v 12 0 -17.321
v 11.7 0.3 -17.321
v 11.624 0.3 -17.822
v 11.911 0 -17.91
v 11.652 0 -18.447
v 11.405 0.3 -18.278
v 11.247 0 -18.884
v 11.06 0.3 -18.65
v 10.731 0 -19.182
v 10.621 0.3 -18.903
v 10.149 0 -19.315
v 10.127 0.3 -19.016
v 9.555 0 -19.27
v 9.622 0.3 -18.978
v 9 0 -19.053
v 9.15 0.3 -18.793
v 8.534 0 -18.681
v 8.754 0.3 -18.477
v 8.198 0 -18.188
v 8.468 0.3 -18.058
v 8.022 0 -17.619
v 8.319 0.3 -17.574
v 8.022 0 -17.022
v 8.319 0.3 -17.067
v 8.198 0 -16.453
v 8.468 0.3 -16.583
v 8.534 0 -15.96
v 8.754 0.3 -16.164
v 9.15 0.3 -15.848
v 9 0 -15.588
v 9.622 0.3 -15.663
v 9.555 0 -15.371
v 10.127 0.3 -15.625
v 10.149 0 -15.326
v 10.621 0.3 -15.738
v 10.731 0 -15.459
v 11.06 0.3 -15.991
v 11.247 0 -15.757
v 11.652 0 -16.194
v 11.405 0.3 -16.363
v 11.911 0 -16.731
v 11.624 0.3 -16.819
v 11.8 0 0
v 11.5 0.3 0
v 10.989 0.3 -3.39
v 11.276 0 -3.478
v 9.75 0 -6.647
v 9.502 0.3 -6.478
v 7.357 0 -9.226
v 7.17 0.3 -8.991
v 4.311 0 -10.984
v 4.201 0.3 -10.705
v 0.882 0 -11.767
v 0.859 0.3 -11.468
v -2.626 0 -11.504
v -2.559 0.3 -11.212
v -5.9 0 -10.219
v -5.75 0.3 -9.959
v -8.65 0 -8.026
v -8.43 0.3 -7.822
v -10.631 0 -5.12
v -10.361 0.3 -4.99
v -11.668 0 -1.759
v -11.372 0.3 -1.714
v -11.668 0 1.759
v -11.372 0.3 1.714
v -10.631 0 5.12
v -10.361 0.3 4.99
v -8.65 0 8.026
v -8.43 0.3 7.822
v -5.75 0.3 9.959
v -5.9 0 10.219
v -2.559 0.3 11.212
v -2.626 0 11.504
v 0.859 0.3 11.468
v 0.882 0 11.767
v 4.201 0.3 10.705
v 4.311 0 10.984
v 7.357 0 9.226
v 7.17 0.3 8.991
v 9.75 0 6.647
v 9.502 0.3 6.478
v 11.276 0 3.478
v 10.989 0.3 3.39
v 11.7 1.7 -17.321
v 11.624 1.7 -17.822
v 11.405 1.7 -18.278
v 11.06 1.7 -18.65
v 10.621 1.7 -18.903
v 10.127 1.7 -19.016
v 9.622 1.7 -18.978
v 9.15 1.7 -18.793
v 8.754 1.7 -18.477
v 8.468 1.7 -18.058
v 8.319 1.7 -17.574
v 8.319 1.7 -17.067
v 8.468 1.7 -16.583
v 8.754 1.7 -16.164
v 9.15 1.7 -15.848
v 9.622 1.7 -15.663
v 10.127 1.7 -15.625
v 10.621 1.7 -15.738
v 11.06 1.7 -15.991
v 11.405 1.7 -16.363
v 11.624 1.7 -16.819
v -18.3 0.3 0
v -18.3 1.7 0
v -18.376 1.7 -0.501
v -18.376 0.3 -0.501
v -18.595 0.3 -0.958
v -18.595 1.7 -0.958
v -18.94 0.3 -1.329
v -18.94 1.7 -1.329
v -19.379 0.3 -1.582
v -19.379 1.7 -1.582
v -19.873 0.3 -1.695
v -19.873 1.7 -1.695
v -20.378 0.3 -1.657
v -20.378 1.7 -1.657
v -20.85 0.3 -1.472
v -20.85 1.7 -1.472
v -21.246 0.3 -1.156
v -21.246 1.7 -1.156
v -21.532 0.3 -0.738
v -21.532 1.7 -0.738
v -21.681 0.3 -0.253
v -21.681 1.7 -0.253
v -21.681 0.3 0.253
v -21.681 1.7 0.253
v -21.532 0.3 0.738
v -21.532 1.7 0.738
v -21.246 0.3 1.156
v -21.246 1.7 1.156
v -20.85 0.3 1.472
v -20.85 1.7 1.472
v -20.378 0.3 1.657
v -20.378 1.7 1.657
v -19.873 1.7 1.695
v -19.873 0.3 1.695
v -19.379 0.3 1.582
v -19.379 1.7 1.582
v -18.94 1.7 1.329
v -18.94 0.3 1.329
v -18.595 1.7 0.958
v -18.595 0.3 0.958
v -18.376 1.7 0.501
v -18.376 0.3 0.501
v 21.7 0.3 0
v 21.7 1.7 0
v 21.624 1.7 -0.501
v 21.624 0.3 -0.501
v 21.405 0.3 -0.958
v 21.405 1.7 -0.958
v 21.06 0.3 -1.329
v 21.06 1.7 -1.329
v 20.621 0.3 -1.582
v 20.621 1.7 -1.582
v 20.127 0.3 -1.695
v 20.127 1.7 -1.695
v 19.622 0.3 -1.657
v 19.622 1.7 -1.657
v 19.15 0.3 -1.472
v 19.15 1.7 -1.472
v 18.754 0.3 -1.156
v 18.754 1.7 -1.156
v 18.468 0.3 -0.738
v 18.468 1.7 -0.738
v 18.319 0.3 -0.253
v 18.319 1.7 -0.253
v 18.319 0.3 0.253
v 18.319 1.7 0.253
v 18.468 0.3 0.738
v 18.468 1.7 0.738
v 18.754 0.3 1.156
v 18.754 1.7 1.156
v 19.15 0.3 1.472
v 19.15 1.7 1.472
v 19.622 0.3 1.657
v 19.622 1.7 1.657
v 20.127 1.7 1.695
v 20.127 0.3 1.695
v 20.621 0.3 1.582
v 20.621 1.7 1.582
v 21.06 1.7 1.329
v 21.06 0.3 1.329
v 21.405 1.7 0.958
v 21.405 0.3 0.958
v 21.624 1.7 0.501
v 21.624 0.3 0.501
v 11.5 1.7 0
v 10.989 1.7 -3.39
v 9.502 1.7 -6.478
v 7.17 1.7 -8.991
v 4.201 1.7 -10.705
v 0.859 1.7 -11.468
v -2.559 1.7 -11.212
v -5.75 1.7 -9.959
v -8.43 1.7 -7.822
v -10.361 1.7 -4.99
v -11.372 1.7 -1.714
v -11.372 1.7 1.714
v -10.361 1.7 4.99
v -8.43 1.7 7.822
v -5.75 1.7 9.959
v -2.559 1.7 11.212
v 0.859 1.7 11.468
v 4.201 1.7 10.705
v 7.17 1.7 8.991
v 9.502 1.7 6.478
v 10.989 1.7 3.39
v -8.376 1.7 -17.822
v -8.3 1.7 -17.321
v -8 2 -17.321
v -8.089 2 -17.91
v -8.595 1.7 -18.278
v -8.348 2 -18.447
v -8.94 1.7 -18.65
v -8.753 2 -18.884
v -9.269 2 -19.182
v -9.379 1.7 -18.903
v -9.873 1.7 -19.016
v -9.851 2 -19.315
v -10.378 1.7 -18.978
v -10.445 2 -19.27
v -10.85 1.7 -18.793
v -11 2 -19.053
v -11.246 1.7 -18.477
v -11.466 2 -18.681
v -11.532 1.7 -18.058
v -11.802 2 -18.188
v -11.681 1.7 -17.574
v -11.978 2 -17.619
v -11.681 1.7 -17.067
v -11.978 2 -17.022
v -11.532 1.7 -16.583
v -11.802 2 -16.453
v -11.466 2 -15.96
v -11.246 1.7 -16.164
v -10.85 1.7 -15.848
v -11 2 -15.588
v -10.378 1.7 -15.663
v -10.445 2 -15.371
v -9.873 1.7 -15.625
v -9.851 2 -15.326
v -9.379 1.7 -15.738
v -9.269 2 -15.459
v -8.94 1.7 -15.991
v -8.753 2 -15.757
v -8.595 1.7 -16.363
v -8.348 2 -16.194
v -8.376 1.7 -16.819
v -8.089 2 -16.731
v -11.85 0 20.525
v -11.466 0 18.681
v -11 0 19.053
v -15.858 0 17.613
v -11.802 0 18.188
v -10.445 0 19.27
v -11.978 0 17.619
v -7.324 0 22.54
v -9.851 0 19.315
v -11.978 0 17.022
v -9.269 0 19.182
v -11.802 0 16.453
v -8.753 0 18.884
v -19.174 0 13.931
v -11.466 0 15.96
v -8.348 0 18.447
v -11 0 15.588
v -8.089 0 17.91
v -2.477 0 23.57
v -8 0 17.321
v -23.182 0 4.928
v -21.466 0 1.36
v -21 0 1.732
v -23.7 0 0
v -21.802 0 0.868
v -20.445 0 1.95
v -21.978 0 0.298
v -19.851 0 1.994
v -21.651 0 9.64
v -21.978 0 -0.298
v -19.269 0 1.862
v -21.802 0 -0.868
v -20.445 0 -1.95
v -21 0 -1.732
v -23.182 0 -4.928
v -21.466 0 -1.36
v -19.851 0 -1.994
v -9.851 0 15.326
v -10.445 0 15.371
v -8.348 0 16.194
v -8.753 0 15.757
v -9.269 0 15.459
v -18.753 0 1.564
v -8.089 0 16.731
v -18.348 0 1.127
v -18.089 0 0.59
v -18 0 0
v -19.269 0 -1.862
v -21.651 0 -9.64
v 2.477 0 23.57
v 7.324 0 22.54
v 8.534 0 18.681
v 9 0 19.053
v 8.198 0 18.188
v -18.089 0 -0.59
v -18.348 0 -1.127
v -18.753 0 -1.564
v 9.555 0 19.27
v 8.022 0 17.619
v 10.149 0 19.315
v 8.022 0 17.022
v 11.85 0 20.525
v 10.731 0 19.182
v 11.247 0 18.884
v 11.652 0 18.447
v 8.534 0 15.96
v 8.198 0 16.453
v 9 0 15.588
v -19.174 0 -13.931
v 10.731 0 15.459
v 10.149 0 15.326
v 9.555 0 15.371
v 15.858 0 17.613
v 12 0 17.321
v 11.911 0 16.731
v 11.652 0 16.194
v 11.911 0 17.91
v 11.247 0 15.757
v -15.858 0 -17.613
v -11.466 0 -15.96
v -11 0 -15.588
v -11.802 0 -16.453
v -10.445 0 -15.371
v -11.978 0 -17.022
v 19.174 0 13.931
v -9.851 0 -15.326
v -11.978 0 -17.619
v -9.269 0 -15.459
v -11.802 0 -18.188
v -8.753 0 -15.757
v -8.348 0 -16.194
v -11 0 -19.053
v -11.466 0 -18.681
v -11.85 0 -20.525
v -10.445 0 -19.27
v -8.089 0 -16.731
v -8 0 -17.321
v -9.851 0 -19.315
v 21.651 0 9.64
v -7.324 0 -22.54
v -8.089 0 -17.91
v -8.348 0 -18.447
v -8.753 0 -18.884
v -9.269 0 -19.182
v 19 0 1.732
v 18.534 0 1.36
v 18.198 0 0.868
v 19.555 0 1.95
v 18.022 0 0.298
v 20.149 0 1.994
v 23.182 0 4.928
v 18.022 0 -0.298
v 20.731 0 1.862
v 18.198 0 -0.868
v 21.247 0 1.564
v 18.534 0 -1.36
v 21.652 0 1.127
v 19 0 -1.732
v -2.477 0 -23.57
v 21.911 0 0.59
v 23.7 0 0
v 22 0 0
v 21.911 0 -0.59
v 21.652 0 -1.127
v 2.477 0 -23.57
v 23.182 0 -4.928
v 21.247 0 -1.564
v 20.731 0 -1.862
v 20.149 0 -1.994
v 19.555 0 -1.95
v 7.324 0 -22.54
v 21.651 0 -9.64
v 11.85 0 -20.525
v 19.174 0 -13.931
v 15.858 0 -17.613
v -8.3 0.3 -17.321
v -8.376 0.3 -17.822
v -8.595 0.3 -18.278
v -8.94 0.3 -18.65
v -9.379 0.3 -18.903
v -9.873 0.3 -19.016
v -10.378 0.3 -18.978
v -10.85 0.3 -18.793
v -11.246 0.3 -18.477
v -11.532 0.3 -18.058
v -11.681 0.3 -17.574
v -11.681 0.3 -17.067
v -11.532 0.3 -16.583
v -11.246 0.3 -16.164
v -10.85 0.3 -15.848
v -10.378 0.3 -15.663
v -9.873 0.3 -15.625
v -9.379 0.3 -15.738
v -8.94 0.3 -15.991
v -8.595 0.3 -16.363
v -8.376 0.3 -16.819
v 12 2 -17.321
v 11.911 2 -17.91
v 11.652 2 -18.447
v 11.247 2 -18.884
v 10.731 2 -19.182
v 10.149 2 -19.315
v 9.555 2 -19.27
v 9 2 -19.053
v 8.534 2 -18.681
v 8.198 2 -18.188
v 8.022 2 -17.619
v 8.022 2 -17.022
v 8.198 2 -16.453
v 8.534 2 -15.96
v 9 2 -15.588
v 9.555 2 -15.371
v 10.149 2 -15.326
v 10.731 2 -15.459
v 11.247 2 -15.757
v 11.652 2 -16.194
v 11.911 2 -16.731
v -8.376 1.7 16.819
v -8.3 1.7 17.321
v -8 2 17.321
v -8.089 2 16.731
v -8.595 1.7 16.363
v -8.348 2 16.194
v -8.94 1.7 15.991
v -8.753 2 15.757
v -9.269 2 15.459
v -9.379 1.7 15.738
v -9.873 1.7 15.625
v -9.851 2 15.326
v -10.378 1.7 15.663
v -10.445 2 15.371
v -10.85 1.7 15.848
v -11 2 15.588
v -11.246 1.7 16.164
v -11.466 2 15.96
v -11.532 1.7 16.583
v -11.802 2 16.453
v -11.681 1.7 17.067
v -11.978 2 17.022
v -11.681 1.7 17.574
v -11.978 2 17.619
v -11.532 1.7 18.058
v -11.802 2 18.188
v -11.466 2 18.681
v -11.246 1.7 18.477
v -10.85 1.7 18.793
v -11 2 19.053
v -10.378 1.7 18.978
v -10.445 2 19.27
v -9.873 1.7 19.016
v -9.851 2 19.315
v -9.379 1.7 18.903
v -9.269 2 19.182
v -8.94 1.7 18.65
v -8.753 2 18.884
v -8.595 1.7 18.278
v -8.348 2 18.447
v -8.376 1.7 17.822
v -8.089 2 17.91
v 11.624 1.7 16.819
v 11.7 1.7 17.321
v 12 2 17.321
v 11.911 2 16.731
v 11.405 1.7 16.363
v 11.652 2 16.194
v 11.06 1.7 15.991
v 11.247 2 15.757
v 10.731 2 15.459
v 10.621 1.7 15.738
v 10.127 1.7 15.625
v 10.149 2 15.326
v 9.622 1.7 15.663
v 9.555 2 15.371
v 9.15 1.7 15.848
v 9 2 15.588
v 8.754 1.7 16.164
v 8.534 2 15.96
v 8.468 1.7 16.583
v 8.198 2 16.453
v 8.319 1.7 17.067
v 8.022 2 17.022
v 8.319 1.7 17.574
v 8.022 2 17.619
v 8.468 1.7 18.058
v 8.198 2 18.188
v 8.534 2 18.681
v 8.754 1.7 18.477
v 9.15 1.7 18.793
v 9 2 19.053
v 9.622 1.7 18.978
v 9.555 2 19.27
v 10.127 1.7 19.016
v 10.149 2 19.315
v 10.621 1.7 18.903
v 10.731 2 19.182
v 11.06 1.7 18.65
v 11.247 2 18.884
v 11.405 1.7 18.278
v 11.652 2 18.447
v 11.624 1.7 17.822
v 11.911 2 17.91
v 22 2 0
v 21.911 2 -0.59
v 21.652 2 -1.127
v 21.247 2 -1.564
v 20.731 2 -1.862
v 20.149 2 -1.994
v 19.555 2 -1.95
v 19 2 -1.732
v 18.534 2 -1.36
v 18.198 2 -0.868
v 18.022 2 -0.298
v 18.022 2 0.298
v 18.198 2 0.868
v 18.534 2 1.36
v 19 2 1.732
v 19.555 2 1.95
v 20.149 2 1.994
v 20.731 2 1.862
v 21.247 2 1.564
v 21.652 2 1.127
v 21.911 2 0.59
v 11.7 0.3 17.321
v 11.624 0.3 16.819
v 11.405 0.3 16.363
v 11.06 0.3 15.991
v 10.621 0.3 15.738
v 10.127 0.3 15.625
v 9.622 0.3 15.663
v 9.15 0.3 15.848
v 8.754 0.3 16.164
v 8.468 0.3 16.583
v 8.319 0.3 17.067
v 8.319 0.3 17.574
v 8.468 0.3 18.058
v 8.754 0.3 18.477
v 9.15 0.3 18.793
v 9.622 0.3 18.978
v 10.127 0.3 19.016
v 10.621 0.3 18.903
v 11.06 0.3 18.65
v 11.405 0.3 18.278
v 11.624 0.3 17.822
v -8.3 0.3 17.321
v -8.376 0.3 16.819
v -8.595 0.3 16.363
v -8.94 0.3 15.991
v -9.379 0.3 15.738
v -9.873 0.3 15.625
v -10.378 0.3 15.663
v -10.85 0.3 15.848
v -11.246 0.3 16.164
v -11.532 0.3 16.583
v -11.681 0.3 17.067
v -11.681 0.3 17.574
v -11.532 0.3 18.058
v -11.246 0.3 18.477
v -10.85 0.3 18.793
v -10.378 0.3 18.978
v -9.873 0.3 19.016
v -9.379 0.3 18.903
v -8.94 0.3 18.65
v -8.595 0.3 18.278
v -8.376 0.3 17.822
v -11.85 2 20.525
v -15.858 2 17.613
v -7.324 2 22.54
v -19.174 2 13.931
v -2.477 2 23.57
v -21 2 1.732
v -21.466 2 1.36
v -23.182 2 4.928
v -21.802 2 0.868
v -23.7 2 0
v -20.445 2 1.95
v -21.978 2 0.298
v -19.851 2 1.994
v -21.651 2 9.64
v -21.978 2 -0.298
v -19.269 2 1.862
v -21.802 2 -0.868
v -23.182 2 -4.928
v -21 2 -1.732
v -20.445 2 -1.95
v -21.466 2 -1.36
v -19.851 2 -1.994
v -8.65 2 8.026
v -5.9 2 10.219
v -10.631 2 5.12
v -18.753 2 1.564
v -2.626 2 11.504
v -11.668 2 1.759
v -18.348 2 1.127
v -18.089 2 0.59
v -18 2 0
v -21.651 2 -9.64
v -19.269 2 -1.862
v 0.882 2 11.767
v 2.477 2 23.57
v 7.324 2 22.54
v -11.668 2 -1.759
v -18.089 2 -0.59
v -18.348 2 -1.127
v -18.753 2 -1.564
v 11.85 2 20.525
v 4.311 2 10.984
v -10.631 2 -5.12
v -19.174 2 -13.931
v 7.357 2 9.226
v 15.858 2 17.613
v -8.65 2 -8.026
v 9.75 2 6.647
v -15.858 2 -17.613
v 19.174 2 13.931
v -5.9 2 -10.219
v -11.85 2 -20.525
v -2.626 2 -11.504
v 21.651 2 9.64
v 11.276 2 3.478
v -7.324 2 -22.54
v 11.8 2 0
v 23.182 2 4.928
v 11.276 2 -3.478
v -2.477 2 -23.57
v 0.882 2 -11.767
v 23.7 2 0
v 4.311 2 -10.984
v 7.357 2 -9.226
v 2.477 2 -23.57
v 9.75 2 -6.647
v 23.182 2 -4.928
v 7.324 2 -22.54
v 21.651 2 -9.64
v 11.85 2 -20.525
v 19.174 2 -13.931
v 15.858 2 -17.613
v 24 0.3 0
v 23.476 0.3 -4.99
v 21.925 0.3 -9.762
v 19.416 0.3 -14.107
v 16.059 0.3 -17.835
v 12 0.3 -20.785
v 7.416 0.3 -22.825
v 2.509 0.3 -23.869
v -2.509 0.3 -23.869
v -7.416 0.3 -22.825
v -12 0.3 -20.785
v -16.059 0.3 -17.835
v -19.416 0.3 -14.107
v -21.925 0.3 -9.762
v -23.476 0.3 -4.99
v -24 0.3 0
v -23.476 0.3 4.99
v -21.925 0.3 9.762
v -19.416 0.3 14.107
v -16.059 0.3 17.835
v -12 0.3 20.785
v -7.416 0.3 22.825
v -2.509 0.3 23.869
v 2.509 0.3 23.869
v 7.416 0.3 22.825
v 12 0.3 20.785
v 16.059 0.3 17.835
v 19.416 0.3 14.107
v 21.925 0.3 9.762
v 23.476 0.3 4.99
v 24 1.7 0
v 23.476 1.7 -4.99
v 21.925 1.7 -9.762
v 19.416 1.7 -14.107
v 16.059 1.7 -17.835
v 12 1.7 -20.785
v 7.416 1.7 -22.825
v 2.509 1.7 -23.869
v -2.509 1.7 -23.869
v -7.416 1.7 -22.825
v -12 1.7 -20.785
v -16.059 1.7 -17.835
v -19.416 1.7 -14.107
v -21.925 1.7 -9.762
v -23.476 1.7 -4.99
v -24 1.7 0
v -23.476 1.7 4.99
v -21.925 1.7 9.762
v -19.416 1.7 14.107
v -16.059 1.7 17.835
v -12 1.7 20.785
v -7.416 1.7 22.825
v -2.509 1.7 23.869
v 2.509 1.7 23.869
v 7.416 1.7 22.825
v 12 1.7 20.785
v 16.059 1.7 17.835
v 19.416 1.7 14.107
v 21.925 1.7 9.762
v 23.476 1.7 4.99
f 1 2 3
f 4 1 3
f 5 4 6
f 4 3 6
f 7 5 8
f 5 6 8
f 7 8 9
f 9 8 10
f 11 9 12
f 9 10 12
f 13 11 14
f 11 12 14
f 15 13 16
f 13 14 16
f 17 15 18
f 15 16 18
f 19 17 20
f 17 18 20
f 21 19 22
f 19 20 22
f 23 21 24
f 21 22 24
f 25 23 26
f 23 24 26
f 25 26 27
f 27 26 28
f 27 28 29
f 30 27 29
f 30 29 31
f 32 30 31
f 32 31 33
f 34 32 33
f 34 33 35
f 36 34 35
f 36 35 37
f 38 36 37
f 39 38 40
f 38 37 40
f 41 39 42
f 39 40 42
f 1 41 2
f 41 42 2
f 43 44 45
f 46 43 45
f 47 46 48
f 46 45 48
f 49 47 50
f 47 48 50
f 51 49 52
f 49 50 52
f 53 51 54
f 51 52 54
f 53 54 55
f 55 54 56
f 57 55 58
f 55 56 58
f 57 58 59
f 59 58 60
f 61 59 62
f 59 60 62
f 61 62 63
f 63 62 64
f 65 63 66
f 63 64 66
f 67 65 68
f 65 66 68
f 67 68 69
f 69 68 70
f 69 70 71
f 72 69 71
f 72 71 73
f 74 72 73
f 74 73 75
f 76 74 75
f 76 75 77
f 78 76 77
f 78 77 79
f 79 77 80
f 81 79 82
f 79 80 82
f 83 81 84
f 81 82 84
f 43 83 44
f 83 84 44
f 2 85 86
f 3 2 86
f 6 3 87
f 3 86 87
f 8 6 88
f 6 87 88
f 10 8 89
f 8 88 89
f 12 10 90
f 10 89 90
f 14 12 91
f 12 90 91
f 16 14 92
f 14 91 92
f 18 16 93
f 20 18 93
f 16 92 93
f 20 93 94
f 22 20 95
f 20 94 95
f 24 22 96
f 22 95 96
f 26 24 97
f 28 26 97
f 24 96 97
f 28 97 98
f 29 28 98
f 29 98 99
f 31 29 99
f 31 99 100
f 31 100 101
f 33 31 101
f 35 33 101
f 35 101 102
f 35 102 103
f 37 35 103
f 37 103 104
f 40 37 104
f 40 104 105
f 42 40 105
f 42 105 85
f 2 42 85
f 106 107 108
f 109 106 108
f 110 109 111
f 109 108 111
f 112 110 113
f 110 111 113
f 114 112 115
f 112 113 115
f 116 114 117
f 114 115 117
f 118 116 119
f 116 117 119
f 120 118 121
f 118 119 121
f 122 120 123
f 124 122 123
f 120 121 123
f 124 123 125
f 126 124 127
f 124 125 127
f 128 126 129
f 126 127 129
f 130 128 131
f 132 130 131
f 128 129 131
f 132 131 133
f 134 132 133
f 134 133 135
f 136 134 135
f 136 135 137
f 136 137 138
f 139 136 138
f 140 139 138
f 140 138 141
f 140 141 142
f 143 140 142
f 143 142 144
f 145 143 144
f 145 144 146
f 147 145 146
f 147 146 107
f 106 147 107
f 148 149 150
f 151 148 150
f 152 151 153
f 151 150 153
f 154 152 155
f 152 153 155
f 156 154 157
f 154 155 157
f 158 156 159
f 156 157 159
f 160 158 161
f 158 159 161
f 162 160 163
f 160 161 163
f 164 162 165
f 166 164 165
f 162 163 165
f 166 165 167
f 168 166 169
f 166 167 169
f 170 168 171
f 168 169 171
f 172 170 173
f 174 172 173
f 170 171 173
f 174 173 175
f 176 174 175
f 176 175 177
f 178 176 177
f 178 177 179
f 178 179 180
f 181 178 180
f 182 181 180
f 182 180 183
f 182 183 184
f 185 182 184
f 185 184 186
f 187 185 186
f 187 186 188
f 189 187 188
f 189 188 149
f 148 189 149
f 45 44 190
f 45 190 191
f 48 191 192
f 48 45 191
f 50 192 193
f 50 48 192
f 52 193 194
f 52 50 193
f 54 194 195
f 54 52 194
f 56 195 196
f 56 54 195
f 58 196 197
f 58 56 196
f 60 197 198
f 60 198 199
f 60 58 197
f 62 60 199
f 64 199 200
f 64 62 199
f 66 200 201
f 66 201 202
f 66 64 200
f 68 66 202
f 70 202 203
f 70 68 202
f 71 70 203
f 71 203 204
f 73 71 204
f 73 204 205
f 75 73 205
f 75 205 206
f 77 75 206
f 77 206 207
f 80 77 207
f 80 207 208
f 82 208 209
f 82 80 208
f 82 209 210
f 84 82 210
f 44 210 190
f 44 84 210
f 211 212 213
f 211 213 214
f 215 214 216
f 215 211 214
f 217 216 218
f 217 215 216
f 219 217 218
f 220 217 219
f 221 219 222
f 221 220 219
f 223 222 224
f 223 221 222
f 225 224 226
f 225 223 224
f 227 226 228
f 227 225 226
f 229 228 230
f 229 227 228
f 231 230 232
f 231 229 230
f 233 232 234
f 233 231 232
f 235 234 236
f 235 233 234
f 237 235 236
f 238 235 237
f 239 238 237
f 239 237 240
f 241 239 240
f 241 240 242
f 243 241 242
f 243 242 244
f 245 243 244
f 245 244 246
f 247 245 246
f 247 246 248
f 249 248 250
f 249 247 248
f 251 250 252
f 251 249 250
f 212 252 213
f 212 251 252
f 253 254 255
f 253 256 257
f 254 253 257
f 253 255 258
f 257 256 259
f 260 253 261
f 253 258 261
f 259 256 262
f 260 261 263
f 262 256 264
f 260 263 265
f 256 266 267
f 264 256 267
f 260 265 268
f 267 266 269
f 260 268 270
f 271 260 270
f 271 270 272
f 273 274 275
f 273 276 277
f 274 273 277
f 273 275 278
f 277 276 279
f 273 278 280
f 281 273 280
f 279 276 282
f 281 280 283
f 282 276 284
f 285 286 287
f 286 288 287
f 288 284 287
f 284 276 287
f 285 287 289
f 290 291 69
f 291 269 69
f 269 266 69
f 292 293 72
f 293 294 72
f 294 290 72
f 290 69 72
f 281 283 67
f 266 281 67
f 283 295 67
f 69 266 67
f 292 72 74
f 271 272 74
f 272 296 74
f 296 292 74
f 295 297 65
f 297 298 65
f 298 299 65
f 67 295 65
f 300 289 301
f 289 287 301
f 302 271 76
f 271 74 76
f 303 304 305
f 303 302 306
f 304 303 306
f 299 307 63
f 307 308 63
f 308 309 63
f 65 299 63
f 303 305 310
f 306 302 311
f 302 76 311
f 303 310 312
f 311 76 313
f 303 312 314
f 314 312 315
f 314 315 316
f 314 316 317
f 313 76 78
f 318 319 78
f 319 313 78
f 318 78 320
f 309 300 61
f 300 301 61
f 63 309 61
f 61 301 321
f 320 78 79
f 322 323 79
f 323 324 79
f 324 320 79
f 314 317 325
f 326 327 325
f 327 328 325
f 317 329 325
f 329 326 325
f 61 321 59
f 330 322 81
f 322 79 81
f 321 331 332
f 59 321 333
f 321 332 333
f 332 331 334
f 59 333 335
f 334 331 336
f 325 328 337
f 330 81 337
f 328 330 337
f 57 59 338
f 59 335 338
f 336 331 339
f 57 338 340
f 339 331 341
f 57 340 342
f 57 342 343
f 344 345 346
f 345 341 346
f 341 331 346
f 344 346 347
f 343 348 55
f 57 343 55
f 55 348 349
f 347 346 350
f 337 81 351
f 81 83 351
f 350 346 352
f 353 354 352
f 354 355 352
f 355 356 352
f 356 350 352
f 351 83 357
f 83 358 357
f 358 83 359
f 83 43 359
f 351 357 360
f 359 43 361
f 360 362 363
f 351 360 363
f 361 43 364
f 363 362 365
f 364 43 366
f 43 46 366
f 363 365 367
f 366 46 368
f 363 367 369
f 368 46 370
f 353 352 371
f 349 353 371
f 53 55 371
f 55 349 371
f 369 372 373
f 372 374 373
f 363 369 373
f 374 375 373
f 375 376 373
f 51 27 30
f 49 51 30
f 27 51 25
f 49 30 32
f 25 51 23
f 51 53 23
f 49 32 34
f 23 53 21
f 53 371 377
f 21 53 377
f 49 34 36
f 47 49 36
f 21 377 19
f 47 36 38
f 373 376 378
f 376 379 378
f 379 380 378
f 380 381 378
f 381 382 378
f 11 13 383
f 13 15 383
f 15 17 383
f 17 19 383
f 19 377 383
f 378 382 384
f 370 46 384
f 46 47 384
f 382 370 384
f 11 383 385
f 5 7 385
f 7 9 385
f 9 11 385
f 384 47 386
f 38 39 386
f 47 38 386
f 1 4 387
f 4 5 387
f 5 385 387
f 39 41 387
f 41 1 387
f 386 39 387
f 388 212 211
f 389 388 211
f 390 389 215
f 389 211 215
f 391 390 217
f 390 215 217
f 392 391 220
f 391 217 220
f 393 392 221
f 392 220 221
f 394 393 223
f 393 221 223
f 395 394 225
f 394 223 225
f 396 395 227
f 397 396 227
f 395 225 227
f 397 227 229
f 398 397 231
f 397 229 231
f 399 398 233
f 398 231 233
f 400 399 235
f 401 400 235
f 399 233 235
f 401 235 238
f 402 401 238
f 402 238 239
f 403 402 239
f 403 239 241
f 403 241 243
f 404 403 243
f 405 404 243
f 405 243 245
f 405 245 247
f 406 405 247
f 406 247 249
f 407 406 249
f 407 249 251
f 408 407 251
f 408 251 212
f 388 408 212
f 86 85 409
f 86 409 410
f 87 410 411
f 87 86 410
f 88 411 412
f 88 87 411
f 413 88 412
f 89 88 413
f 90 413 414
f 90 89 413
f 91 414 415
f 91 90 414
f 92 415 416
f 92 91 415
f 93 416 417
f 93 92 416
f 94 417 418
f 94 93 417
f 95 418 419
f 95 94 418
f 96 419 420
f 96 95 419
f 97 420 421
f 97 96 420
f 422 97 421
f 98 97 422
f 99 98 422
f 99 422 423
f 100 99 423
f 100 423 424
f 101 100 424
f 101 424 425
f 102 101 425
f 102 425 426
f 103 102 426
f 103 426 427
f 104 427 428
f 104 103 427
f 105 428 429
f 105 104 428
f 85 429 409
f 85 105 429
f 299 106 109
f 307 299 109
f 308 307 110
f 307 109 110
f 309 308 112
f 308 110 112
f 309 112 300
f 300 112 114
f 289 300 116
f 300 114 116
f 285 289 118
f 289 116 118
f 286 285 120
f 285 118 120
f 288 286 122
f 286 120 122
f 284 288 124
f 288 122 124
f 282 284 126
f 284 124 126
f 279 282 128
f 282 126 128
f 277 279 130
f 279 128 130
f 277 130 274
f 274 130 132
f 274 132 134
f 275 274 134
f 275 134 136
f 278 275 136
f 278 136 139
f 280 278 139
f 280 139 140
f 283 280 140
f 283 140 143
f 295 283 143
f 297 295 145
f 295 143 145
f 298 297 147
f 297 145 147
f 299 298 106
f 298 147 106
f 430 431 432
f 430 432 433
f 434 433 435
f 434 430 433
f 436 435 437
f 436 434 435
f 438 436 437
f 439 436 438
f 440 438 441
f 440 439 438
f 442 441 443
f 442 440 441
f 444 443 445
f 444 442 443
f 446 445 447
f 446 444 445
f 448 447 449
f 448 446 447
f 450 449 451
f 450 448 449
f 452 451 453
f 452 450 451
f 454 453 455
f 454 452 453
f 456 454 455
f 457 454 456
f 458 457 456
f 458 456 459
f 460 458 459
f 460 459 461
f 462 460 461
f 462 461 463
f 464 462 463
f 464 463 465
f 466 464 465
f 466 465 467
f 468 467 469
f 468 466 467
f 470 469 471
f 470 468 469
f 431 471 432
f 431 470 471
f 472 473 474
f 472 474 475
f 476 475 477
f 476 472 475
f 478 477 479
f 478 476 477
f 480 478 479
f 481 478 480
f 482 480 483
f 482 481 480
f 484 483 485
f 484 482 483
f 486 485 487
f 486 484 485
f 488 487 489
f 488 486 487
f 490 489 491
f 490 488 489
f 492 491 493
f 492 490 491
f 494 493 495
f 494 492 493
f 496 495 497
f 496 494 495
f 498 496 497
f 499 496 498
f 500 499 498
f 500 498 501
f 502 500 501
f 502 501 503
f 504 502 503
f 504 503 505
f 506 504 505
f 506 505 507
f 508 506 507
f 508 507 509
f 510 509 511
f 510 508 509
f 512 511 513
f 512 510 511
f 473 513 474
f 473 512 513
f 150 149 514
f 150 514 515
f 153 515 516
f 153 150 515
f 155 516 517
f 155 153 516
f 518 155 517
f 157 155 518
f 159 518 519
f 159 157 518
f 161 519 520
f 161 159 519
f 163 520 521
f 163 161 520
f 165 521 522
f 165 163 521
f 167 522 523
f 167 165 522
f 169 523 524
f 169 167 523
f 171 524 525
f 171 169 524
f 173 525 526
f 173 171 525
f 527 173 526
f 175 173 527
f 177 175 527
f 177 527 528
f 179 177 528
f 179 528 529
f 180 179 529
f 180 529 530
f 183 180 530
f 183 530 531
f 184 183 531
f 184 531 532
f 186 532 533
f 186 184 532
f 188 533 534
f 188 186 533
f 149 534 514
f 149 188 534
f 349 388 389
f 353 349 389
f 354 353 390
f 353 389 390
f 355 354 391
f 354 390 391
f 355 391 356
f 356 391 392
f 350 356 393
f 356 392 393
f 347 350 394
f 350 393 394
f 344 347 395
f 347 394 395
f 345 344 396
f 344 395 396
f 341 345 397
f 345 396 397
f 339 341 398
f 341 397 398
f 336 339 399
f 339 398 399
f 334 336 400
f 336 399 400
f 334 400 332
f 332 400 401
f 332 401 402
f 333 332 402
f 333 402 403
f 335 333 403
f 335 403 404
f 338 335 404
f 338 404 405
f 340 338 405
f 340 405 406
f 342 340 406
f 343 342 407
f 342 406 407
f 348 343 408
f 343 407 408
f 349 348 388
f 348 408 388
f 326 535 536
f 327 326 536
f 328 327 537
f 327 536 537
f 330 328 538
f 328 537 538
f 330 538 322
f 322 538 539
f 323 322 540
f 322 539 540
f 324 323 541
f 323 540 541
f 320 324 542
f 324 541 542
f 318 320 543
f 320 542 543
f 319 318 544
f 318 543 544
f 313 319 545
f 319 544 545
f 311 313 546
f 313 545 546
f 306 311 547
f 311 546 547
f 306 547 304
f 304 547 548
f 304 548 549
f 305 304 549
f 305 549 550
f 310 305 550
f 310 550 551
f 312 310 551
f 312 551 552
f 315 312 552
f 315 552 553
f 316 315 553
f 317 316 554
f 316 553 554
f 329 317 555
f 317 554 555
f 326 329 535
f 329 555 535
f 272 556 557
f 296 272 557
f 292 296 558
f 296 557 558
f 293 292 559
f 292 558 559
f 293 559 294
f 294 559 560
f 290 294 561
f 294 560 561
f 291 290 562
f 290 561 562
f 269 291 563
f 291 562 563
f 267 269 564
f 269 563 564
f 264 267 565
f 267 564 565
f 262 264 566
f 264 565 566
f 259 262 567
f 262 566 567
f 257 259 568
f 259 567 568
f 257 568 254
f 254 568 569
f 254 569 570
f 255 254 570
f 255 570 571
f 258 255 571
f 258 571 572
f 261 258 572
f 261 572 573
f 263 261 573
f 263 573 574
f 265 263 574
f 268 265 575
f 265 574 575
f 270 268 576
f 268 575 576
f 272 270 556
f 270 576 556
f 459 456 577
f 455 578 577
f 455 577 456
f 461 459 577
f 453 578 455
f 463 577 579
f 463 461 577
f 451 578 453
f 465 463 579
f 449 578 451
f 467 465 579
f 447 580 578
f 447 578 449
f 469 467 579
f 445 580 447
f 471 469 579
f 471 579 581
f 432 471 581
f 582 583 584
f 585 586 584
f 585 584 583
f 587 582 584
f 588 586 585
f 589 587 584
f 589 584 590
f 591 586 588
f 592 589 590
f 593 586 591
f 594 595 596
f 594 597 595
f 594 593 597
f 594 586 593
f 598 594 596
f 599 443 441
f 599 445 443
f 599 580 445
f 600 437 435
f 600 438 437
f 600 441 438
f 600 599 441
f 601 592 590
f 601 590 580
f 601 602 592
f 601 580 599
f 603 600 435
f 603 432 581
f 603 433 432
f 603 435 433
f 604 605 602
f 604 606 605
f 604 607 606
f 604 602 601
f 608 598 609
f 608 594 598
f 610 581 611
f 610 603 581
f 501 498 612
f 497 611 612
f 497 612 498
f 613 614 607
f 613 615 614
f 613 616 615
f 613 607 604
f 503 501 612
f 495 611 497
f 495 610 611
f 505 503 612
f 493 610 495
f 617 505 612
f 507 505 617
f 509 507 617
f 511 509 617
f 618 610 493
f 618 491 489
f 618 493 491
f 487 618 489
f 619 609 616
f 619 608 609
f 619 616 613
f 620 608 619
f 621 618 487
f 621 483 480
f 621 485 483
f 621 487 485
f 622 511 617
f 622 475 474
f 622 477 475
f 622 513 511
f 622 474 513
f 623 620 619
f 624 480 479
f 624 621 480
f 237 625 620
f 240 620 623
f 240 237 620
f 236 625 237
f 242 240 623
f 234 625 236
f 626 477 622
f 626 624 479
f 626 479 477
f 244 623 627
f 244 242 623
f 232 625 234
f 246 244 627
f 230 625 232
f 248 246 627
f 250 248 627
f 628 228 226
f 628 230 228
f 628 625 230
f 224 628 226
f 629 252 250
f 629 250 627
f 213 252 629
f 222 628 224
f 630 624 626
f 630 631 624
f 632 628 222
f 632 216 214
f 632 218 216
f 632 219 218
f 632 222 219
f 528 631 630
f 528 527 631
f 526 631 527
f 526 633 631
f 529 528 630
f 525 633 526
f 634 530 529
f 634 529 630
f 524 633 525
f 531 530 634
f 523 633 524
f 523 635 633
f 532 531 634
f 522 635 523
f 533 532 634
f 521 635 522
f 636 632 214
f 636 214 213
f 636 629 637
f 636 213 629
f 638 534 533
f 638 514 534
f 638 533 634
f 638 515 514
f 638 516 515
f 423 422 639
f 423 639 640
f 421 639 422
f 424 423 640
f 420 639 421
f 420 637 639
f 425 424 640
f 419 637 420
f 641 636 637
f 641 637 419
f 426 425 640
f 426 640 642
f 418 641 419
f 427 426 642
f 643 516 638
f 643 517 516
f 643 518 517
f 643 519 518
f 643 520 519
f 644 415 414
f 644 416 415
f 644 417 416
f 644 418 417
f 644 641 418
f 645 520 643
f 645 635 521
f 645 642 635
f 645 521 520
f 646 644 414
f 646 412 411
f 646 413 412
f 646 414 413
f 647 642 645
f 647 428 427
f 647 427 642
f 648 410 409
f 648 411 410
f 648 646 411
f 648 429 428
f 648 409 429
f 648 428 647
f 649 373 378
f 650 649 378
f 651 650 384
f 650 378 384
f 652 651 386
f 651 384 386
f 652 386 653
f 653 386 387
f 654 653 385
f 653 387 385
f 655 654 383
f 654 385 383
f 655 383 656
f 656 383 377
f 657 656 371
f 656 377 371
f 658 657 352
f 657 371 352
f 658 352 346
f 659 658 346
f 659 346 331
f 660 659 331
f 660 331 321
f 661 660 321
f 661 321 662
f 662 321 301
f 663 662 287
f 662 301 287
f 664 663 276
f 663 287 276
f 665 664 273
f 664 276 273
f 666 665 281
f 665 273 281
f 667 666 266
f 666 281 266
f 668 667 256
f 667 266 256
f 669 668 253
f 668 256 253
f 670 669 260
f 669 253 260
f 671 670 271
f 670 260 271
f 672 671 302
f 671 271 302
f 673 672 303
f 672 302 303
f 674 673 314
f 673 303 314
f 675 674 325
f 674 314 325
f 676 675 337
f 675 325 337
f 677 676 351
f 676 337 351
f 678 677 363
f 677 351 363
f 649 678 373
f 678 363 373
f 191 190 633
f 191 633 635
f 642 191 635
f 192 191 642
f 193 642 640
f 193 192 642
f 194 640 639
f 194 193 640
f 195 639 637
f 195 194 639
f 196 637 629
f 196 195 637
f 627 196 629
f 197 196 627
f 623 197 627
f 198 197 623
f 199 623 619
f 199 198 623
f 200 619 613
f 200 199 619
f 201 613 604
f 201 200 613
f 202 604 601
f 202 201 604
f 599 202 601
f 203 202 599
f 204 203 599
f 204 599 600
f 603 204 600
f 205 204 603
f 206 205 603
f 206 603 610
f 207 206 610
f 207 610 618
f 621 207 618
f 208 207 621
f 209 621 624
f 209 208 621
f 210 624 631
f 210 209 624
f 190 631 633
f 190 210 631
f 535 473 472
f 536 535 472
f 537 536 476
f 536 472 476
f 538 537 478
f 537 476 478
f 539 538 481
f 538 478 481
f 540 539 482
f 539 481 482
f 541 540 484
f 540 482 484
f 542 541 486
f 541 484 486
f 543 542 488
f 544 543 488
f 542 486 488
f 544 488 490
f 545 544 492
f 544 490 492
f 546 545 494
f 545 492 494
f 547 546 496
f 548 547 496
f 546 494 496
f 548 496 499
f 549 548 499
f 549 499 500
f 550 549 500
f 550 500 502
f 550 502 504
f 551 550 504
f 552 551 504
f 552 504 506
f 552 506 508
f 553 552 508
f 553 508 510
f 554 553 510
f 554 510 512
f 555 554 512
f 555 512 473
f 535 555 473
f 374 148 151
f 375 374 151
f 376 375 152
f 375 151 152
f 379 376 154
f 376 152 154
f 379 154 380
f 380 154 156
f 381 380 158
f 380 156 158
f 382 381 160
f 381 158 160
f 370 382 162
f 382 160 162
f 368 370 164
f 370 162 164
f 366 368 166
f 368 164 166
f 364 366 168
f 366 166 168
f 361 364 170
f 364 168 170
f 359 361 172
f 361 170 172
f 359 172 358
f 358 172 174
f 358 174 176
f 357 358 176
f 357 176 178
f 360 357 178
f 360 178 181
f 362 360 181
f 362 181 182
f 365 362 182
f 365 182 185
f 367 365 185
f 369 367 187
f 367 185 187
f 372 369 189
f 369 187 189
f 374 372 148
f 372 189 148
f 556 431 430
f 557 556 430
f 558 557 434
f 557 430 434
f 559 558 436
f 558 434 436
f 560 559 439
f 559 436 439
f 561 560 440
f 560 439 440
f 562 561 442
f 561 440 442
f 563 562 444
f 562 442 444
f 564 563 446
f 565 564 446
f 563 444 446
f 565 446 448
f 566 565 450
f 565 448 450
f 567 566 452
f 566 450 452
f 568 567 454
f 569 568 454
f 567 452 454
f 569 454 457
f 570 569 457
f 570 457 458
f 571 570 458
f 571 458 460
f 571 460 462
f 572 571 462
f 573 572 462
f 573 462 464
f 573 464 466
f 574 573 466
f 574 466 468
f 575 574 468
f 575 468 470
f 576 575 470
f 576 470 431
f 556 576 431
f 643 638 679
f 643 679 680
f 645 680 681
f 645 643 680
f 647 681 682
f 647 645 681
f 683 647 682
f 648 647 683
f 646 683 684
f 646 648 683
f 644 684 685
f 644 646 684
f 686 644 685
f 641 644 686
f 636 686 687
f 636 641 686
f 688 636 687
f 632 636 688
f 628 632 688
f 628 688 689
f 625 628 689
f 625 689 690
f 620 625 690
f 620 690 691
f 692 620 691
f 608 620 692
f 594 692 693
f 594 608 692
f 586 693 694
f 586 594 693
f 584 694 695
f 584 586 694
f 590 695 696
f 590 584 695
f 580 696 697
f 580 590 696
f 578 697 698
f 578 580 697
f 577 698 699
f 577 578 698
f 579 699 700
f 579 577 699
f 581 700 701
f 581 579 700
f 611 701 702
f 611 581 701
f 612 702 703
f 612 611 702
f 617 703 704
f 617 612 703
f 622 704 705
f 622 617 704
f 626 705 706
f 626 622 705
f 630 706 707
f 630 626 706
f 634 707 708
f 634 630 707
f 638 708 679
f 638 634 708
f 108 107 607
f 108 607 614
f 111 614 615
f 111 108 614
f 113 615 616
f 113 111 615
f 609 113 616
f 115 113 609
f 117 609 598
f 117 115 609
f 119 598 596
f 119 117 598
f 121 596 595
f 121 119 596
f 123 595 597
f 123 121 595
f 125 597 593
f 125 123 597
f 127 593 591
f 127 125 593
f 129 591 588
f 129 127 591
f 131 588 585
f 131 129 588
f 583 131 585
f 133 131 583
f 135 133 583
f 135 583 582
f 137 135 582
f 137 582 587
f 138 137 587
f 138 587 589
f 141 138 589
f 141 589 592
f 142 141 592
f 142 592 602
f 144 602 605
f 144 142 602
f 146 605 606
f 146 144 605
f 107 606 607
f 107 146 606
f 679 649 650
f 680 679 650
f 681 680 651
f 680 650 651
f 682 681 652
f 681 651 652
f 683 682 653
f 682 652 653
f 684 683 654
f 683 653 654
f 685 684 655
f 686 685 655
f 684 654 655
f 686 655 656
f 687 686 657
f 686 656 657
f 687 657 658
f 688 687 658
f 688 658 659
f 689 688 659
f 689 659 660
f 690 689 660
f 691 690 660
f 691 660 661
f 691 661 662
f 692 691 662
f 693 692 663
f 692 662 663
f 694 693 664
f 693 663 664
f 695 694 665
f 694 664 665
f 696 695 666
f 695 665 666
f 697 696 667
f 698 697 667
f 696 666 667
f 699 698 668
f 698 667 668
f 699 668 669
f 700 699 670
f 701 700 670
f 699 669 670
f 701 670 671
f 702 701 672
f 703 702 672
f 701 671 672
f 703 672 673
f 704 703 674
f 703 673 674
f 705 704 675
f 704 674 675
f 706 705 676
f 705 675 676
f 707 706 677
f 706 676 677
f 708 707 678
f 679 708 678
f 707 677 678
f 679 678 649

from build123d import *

# Parameters (mm, degrees)
SKETCH1_R           = 24
SKETCH1_R_2         = 11.5
BOSS_EXTRUDE1_DEPTH = 2
SKETCH2_R           = 1.7
CUT_EXTRUDE1_DEPTH  = 3
CHAMFER2_SIZE       = 0.3


with BuildPart() as part:
    # Sketch1 → Boss-Extrude1 (new body)
    with BuildSketch(Plane(origin=(0, 0, 0), x_dir=(1, 0, 0), z_dir=(0, 1, 0))):
        Circle(SKETCH1_R)
        Circle(SKETCH1_R_2, mode=Mode.SUBTRACT)
    extrude(amount=BOSS_EXTRUDE1_DEPTH)

    # Sketch2 → Cut-Extrude1 (cut, through all)
    with BuildSketch(Plane(origin=(0, 2, 0), x_dir=(1, 0, 0), z_dir=(0, 1, 0))):
        with Locations((-20, 0)):
            Circle(SKETCH2_R)
        with Locations((-10, 17.320508076)):
            Circle(SKETCH2_R)
        with Locations((10, 17.320508076)):
            Circle(SKETCH2_R)
        with Locations((20, 0)):
            Circle(SKETCH2_R)
        with Locations((10, -17.320508076)):
            Circle(SKETCH2_R)
        with Locations((-10, -17.320508076)):
            Circle(SKETCH2_R)
    extrude(amount=-CUT_EXTRUDE1_DEPTH, mode=Mode.SUBTRACT)

    # Chamfer2
    chamfer2_edges = [part.edges().sort_by_distance(p)[0] for p in [
        (-21.7, 0, 0),
        (-21.7, 2, 0),
        (-24, 0, 0),
        (-11.7, 0, 17.320508076),
        (-11.7, 2, 17.320508076),
        (8.3, 0, 17.320508076),
        (8.3, 2, 17.320508076),
        (18.3, 0, 0),
        (18.3, 2, 0),
        (8.3, 0, -17.320508076),
        (8.3, 2, -17.320508076),
        (-11.7, 0, -17.320508076),
        (-11.7, 2, -17.320508076),
        (-24, 2, 0),
        (-11.5, 0, 0),
        (-11.5, 2, 0),
    ]]
    chamfer(chamfer2_edges, length=CHAMFER2_SIZE)


solid = part.part
